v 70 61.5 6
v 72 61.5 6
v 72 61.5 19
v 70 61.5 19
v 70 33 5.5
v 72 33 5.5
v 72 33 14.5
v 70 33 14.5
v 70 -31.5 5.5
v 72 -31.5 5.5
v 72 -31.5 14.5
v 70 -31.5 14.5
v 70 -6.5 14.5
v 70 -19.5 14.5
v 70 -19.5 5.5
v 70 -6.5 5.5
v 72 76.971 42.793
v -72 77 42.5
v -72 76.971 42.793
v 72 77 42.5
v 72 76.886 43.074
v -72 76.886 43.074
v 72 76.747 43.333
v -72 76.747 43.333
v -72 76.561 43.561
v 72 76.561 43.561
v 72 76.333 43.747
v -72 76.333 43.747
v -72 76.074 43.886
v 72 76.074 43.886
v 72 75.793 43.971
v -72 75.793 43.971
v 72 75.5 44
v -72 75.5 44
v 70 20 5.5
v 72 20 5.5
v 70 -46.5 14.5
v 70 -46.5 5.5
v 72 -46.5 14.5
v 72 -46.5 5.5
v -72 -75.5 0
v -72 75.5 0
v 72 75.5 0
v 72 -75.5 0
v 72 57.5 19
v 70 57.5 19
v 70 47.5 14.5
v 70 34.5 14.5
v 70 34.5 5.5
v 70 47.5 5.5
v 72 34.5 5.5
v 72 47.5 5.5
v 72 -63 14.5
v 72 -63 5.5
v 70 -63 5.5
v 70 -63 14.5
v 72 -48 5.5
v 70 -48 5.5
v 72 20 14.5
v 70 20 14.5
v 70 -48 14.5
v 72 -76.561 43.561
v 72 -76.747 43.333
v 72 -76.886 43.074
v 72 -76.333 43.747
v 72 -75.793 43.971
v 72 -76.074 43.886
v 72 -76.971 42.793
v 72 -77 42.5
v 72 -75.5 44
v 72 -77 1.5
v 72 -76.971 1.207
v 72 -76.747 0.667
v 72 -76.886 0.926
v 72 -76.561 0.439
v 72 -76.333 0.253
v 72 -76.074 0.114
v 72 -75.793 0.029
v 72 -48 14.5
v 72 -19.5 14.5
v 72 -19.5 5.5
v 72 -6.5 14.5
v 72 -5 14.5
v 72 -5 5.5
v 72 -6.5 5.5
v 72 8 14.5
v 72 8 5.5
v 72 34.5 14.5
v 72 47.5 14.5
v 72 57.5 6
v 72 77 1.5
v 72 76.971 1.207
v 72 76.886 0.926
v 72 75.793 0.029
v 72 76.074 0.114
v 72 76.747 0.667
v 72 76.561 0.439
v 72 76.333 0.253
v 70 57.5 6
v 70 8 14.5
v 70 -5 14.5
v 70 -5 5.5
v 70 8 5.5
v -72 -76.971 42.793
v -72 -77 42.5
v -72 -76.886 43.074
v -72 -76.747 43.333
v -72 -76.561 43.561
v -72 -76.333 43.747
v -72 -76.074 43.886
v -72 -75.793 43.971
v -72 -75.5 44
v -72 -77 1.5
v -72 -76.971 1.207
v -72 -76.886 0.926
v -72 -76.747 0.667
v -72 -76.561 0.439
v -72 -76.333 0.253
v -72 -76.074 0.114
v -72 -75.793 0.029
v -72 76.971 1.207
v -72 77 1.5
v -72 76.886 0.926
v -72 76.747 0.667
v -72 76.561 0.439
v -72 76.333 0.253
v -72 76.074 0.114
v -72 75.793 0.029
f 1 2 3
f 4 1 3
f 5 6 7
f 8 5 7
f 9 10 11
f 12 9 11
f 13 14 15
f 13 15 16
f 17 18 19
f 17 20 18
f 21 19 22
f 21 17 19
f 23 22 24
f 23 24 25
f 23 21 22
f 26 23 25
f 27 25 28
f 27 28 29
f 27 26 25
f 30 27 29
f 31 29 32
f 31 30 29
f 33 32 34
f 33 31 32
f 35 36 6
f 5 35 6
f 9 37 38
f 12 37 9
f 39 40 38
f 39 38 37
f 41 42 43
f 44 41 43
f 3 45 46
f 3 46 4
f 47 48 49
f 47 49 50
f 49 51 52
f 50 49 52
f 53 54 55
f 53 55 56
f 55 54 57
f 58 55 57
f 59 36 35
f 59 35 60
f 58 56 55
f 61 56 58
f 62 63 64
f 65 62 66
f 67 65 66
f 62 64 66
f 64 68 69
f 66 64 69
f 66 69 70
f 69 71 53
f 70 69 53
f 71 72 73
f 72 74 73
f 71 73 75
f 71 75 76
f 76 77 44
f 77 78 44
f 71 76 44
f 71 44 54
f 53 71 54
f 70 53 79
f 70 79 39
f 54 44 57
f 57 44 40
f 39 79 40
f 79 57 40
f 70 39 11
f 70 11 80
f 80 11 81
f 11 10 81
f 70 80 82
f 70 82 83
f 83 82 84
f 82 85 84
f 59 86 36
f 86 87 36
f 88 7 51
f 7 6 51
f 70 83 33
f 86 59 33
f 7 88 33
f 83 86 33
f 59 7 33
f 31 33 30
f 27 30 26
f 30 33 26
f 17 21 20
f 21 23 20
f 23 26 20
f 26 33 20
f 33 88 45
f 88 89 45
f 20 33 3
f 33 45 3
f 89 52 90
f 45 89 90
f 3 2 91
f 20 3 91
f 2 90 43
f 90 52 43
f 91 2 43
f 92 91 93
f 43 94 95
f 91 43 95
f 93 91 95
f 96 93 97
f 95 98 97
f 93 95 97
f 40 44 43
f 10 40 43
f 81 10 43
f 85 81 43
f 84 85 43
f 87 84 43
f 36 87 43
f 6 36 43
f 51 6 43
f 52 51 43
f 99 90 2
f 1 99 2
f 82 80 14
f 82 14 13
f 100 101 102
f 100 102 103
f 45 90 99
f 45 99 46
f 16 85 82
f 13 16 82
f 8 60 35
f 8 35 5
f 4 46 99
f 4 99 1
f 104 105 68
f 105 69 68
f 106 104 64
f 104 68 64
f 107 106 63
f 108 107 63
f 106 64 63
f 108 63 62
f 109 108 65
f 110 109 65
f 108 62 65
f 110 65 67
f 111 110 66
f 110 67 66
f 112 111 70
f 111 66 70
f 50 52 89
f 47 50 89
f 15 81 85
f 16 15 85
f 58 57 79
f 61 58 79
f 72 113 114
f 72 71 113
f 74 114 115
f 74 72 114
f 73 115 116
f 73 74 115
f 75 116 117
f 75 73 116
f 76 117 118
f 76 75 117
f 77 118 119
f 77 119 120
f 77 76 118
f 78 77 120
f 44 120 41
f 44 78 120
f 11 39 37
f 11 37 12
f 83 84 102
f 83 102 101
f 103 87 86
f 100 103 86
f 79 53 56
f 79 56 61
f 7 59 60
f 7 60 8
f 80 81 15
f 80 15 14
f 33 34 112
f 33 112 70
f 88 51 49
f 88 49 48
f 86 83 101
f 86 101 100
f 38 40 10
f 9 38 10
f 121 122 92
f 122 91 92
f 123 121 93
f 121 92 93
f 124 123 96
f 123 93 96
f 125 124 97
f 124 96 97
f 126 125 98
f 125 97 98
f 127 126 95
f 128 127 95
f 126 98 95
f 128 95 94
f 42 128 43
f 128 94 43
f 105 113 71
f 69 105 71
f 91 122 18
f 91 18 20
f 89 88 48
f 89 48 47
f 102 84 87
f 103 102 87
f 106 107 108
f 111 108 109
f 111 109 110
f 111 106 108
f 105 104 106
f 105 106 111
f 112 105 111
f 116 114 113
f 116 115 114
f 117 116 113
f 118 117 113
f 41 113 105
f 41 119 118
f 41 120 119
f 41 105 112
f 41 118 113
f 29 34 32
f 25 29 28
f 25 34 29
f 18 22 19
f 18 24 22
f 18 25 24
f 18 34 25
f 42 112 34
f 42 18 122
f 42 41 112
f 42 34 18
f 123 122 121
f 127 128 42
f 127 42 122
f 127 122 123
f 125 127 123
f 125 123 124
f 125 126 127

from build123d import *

# Parameters (mm, degrees)
F0_W     = 144
F0_H     = 154
F1_DEPTH = 44
F2_W     = 15
F2_H     = 9
F2_W_2   = 13
F2_W_3   = 4
F2_H_2   = 13
F3_DEPTH = 2
F4_R     = 1.5


with BuildPart() as f1:
    # F0 (on Top) → F1 (new body)
    with BuildSketch(Plane.XY):
        Rectangle(F0_W, F0_H)
    extrude(amount=F1_DEPTH)

    # F2 (on face) → F3 (cut)
    with BuildSketch(Plane.YZ.offset(72)):
        with Locations((-55.5, 10)):
            Rectangle(F2_W, F2_H)
        with Locations((-39, 10)):
            Rectangle(F2_W, F2_H)
        with Locations((-13, 10)):
            Rectangle(F2_W_2, F2_H)
        with Locations((1.5, 10)):
            Rectangle(F2_W_2, F2_H)
        with Locations((26.5, 10)):
            Rectangle(F2_W_2, F2_H)
        with Locations((41, 10)):
            Rectangle(F2_W_2, F2_H)
        with Locations((59.5, 12.5)):
            Rectangle(F2_W_3, F2_H_2)
    extrude(amount=-F3_DEPTH, mode=Mode.SUBTRACT)

    # F4
    f4_edges = [f1.edges().sort_by_distance(p)[0] for p in [
        (0, -77, 44),
        (0, 77, 44),
        (0, -77, 0),
        (0, 77, 0),
    ]]
    fillet(f4_edges, radius=F4_R)


solid = f1.part
